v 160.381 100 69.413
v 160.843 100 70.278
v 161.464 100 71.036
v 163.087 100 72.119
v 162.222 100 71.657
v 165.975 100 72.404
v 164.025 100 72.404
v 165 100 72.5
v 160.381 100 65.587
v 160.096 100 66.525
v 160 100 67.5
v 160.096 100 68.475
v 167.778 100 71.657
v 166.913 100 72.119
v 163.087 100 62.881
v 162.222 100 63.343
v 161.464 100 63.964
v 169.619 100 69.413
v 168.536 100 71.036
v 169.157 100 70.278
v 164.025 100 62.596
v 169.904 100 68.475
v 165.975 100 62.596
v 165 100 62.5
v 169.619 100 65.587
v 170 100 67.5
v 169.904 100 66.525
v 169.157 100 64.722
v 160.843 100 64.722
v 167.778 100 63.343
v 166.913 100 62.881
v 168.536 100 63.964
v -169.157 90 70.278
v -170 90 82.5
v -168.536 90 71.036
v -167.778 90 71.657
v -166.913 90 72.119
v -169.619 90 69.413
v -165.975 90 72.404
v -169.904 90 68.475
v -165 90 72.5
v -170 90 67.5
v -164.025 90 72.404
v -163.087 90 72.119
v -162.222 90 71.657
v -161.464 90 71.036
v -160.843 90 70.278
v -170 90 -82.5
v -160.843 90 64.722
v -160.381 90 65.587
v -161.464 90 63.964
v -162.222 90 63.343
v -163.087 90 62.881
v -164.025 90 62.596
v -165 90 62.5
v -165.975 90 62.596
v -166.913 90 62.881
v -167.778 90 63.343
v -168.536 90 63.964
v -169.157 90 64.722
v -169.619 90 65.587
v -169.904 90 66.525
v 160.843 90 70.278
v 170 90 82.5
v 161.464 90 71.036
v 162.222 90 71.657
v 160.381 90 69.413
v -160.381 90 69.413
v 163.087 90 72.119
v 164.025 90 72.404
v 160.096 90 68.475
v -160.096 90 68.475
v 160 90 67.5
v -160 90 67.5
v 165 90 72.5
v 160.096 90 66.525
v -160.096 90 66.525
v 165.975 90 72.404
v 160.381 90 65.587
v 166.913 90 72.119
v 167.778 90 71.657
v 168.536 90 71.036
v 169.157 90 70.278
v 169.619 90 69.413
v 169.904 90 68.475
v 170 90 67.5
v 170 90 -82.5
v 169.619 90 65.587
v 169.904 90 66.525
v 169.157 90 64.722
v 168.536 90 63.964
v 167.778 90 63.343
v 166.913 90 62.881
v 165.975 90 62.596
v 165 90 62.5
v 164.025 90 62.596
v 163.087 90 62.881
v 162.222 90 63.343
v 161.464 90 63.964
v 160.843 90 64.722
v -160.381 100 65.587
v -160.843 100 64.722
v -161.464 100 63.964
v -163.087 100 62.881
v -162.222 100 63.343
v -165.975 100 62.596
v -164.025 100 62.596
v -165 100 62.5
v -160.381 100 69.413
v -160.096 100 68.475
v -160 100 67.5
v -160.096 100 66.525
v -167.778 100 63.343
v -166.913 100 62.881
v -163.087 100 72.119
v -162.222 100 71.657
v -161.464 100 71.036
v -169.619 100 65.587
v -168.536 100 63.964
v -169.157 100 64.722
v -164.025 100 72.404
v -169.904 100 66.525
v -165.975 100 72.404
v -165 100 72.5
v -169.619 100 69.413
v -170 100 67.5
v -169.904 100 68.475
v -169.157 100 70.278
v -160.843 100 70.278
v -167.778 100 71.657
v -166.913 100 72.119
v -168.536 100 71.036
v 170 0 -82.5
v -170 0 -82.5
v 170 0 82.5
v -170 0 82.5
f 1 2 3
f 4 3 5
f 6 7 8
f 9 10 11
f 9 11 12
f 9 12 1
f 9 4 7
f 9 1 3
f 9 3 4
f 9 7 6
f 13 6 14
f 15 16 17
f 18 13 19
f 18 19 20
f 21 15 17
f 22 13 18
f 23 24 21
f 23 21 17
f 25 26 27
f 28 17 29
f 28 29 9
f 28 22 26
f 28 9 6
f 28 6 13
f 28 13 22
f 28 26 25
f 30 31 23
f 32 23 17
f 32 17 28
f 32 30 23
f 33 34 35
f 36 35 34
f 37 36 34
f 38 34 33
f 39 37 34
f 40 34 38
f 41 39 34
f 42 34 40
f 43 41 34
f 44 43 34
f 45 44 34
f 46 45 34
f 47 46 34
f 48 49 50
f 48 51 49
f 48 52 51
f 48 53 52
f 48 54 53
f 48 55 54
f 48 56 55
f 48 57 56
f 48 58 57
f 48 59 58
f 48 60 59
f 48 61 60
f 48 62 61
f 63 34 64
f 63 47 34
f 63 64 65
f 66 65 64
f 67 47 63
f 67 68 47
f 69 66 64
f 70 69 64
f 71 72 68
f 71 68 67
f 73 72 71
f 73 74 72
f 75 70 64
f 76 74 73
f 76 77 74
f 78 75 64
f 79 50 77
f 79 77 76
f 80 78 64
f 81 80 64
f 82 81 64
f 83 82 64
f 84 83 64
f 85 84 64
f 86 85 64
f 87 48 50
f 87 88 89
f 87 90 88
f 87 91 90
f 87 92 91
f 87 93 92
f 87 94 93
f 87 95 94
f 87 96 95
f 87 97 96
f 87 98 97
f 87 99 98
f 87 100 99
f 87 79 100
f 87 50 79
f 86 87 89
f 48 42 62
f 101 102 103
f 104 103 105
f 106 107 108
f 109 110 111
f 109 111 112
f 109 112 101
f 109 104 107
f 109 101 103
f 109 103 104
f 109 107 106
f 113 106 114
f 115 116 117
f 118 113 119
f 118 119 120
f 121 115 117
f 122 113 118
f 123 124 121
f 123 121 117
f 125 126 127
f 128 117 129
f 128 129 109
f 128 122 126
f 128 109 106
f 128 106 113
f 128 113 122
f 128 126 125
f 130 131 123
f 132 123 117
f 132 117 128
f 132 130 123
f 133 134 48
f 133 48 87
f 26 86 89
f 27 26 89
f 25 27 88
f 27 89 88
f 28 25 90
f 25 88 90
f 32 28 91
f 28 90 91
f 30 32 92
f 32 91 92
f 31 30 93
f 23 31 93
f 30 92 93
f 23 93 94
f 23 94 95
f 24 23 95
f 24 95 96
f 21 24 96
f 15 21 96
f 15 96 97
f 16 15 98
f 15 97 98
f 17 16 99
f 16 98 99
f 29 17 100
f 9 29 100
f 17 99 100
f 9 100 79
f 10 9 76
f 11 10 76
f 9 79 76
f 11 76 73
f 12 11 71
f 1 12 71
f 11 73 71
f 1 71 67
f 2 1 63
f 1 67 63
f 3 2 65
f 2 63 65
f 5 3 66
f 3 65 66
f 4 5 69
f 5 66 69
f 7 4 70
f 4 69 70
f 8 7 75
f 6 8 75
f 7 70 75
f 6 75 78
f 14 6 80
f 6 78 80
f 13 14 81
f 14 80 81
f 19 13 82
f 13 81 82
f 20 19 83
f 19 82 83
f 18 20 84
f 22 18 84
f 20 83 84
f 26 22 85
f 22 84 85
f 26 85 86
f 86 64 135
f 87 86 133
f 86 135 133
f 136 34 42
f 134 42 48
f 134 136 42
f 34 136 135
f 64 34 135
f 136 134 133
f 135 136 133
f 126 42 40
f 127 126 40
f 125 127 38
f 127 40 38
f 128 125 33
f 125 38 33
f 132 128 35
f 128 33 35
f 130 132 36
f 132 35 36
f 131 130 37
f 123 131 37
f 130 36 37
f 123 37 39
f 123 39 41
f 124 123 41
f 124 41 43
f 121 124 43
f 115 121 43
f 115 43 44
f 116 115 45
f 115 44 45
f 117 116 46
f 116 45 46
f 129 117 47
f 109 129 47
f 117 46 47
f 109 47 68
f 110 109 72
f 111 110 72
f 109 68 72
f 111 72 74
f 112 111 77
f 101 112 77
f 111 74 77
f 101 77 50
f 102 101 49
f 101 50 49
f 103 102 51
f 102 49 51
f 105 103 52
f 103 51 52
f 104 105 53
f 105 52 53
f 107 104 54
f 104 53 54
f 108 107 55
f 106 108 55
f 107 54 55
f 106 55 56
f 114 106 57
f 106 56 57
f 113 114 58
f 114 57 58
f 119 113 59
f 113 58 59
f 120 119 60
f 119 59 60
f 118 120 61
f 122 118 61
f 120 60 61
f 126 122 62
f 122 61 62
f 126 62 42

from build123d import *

# Parameters (mm, degrees)
SKETCH1_W           = 340
SKETCH1_H           = 165
BOSS_EXTRUDE1_DEPTH = 90
SKETCH2_R           = 5
BOSS_EXTRUDE2_DEPTH = 10


with BuildPart() as part:
    # Sketch1 → Boss-Extrude1 (new body)
    with BuildSketch(Plane(origin=(0, 0, 0), x_dir=(1, 0, 0), z_dir=(0, 1, 0))):
        Rectangle(SKETCH1_W, SKETCH1_H)
    extrude(amount=BOSS_EXTRUDE1_DEPTH)

    # Sketch2 → Boss-Extrude2 (add)
    with BuildSketch(Plane(origin=(0, 90, 0), x_dir=(1, 0, 0), z_dir=(0, 1, 0))):
        with Locations(Location((-165, -67.5, 0), (0, 0, 180))):
            Circle(SKETCH2_R)
        with Locations((165, -67.5)):
            Circle(SKETCH2_R)
    extrude(amount=BOSS_EXTRUDE2_DEPTH)


solid = part.part
